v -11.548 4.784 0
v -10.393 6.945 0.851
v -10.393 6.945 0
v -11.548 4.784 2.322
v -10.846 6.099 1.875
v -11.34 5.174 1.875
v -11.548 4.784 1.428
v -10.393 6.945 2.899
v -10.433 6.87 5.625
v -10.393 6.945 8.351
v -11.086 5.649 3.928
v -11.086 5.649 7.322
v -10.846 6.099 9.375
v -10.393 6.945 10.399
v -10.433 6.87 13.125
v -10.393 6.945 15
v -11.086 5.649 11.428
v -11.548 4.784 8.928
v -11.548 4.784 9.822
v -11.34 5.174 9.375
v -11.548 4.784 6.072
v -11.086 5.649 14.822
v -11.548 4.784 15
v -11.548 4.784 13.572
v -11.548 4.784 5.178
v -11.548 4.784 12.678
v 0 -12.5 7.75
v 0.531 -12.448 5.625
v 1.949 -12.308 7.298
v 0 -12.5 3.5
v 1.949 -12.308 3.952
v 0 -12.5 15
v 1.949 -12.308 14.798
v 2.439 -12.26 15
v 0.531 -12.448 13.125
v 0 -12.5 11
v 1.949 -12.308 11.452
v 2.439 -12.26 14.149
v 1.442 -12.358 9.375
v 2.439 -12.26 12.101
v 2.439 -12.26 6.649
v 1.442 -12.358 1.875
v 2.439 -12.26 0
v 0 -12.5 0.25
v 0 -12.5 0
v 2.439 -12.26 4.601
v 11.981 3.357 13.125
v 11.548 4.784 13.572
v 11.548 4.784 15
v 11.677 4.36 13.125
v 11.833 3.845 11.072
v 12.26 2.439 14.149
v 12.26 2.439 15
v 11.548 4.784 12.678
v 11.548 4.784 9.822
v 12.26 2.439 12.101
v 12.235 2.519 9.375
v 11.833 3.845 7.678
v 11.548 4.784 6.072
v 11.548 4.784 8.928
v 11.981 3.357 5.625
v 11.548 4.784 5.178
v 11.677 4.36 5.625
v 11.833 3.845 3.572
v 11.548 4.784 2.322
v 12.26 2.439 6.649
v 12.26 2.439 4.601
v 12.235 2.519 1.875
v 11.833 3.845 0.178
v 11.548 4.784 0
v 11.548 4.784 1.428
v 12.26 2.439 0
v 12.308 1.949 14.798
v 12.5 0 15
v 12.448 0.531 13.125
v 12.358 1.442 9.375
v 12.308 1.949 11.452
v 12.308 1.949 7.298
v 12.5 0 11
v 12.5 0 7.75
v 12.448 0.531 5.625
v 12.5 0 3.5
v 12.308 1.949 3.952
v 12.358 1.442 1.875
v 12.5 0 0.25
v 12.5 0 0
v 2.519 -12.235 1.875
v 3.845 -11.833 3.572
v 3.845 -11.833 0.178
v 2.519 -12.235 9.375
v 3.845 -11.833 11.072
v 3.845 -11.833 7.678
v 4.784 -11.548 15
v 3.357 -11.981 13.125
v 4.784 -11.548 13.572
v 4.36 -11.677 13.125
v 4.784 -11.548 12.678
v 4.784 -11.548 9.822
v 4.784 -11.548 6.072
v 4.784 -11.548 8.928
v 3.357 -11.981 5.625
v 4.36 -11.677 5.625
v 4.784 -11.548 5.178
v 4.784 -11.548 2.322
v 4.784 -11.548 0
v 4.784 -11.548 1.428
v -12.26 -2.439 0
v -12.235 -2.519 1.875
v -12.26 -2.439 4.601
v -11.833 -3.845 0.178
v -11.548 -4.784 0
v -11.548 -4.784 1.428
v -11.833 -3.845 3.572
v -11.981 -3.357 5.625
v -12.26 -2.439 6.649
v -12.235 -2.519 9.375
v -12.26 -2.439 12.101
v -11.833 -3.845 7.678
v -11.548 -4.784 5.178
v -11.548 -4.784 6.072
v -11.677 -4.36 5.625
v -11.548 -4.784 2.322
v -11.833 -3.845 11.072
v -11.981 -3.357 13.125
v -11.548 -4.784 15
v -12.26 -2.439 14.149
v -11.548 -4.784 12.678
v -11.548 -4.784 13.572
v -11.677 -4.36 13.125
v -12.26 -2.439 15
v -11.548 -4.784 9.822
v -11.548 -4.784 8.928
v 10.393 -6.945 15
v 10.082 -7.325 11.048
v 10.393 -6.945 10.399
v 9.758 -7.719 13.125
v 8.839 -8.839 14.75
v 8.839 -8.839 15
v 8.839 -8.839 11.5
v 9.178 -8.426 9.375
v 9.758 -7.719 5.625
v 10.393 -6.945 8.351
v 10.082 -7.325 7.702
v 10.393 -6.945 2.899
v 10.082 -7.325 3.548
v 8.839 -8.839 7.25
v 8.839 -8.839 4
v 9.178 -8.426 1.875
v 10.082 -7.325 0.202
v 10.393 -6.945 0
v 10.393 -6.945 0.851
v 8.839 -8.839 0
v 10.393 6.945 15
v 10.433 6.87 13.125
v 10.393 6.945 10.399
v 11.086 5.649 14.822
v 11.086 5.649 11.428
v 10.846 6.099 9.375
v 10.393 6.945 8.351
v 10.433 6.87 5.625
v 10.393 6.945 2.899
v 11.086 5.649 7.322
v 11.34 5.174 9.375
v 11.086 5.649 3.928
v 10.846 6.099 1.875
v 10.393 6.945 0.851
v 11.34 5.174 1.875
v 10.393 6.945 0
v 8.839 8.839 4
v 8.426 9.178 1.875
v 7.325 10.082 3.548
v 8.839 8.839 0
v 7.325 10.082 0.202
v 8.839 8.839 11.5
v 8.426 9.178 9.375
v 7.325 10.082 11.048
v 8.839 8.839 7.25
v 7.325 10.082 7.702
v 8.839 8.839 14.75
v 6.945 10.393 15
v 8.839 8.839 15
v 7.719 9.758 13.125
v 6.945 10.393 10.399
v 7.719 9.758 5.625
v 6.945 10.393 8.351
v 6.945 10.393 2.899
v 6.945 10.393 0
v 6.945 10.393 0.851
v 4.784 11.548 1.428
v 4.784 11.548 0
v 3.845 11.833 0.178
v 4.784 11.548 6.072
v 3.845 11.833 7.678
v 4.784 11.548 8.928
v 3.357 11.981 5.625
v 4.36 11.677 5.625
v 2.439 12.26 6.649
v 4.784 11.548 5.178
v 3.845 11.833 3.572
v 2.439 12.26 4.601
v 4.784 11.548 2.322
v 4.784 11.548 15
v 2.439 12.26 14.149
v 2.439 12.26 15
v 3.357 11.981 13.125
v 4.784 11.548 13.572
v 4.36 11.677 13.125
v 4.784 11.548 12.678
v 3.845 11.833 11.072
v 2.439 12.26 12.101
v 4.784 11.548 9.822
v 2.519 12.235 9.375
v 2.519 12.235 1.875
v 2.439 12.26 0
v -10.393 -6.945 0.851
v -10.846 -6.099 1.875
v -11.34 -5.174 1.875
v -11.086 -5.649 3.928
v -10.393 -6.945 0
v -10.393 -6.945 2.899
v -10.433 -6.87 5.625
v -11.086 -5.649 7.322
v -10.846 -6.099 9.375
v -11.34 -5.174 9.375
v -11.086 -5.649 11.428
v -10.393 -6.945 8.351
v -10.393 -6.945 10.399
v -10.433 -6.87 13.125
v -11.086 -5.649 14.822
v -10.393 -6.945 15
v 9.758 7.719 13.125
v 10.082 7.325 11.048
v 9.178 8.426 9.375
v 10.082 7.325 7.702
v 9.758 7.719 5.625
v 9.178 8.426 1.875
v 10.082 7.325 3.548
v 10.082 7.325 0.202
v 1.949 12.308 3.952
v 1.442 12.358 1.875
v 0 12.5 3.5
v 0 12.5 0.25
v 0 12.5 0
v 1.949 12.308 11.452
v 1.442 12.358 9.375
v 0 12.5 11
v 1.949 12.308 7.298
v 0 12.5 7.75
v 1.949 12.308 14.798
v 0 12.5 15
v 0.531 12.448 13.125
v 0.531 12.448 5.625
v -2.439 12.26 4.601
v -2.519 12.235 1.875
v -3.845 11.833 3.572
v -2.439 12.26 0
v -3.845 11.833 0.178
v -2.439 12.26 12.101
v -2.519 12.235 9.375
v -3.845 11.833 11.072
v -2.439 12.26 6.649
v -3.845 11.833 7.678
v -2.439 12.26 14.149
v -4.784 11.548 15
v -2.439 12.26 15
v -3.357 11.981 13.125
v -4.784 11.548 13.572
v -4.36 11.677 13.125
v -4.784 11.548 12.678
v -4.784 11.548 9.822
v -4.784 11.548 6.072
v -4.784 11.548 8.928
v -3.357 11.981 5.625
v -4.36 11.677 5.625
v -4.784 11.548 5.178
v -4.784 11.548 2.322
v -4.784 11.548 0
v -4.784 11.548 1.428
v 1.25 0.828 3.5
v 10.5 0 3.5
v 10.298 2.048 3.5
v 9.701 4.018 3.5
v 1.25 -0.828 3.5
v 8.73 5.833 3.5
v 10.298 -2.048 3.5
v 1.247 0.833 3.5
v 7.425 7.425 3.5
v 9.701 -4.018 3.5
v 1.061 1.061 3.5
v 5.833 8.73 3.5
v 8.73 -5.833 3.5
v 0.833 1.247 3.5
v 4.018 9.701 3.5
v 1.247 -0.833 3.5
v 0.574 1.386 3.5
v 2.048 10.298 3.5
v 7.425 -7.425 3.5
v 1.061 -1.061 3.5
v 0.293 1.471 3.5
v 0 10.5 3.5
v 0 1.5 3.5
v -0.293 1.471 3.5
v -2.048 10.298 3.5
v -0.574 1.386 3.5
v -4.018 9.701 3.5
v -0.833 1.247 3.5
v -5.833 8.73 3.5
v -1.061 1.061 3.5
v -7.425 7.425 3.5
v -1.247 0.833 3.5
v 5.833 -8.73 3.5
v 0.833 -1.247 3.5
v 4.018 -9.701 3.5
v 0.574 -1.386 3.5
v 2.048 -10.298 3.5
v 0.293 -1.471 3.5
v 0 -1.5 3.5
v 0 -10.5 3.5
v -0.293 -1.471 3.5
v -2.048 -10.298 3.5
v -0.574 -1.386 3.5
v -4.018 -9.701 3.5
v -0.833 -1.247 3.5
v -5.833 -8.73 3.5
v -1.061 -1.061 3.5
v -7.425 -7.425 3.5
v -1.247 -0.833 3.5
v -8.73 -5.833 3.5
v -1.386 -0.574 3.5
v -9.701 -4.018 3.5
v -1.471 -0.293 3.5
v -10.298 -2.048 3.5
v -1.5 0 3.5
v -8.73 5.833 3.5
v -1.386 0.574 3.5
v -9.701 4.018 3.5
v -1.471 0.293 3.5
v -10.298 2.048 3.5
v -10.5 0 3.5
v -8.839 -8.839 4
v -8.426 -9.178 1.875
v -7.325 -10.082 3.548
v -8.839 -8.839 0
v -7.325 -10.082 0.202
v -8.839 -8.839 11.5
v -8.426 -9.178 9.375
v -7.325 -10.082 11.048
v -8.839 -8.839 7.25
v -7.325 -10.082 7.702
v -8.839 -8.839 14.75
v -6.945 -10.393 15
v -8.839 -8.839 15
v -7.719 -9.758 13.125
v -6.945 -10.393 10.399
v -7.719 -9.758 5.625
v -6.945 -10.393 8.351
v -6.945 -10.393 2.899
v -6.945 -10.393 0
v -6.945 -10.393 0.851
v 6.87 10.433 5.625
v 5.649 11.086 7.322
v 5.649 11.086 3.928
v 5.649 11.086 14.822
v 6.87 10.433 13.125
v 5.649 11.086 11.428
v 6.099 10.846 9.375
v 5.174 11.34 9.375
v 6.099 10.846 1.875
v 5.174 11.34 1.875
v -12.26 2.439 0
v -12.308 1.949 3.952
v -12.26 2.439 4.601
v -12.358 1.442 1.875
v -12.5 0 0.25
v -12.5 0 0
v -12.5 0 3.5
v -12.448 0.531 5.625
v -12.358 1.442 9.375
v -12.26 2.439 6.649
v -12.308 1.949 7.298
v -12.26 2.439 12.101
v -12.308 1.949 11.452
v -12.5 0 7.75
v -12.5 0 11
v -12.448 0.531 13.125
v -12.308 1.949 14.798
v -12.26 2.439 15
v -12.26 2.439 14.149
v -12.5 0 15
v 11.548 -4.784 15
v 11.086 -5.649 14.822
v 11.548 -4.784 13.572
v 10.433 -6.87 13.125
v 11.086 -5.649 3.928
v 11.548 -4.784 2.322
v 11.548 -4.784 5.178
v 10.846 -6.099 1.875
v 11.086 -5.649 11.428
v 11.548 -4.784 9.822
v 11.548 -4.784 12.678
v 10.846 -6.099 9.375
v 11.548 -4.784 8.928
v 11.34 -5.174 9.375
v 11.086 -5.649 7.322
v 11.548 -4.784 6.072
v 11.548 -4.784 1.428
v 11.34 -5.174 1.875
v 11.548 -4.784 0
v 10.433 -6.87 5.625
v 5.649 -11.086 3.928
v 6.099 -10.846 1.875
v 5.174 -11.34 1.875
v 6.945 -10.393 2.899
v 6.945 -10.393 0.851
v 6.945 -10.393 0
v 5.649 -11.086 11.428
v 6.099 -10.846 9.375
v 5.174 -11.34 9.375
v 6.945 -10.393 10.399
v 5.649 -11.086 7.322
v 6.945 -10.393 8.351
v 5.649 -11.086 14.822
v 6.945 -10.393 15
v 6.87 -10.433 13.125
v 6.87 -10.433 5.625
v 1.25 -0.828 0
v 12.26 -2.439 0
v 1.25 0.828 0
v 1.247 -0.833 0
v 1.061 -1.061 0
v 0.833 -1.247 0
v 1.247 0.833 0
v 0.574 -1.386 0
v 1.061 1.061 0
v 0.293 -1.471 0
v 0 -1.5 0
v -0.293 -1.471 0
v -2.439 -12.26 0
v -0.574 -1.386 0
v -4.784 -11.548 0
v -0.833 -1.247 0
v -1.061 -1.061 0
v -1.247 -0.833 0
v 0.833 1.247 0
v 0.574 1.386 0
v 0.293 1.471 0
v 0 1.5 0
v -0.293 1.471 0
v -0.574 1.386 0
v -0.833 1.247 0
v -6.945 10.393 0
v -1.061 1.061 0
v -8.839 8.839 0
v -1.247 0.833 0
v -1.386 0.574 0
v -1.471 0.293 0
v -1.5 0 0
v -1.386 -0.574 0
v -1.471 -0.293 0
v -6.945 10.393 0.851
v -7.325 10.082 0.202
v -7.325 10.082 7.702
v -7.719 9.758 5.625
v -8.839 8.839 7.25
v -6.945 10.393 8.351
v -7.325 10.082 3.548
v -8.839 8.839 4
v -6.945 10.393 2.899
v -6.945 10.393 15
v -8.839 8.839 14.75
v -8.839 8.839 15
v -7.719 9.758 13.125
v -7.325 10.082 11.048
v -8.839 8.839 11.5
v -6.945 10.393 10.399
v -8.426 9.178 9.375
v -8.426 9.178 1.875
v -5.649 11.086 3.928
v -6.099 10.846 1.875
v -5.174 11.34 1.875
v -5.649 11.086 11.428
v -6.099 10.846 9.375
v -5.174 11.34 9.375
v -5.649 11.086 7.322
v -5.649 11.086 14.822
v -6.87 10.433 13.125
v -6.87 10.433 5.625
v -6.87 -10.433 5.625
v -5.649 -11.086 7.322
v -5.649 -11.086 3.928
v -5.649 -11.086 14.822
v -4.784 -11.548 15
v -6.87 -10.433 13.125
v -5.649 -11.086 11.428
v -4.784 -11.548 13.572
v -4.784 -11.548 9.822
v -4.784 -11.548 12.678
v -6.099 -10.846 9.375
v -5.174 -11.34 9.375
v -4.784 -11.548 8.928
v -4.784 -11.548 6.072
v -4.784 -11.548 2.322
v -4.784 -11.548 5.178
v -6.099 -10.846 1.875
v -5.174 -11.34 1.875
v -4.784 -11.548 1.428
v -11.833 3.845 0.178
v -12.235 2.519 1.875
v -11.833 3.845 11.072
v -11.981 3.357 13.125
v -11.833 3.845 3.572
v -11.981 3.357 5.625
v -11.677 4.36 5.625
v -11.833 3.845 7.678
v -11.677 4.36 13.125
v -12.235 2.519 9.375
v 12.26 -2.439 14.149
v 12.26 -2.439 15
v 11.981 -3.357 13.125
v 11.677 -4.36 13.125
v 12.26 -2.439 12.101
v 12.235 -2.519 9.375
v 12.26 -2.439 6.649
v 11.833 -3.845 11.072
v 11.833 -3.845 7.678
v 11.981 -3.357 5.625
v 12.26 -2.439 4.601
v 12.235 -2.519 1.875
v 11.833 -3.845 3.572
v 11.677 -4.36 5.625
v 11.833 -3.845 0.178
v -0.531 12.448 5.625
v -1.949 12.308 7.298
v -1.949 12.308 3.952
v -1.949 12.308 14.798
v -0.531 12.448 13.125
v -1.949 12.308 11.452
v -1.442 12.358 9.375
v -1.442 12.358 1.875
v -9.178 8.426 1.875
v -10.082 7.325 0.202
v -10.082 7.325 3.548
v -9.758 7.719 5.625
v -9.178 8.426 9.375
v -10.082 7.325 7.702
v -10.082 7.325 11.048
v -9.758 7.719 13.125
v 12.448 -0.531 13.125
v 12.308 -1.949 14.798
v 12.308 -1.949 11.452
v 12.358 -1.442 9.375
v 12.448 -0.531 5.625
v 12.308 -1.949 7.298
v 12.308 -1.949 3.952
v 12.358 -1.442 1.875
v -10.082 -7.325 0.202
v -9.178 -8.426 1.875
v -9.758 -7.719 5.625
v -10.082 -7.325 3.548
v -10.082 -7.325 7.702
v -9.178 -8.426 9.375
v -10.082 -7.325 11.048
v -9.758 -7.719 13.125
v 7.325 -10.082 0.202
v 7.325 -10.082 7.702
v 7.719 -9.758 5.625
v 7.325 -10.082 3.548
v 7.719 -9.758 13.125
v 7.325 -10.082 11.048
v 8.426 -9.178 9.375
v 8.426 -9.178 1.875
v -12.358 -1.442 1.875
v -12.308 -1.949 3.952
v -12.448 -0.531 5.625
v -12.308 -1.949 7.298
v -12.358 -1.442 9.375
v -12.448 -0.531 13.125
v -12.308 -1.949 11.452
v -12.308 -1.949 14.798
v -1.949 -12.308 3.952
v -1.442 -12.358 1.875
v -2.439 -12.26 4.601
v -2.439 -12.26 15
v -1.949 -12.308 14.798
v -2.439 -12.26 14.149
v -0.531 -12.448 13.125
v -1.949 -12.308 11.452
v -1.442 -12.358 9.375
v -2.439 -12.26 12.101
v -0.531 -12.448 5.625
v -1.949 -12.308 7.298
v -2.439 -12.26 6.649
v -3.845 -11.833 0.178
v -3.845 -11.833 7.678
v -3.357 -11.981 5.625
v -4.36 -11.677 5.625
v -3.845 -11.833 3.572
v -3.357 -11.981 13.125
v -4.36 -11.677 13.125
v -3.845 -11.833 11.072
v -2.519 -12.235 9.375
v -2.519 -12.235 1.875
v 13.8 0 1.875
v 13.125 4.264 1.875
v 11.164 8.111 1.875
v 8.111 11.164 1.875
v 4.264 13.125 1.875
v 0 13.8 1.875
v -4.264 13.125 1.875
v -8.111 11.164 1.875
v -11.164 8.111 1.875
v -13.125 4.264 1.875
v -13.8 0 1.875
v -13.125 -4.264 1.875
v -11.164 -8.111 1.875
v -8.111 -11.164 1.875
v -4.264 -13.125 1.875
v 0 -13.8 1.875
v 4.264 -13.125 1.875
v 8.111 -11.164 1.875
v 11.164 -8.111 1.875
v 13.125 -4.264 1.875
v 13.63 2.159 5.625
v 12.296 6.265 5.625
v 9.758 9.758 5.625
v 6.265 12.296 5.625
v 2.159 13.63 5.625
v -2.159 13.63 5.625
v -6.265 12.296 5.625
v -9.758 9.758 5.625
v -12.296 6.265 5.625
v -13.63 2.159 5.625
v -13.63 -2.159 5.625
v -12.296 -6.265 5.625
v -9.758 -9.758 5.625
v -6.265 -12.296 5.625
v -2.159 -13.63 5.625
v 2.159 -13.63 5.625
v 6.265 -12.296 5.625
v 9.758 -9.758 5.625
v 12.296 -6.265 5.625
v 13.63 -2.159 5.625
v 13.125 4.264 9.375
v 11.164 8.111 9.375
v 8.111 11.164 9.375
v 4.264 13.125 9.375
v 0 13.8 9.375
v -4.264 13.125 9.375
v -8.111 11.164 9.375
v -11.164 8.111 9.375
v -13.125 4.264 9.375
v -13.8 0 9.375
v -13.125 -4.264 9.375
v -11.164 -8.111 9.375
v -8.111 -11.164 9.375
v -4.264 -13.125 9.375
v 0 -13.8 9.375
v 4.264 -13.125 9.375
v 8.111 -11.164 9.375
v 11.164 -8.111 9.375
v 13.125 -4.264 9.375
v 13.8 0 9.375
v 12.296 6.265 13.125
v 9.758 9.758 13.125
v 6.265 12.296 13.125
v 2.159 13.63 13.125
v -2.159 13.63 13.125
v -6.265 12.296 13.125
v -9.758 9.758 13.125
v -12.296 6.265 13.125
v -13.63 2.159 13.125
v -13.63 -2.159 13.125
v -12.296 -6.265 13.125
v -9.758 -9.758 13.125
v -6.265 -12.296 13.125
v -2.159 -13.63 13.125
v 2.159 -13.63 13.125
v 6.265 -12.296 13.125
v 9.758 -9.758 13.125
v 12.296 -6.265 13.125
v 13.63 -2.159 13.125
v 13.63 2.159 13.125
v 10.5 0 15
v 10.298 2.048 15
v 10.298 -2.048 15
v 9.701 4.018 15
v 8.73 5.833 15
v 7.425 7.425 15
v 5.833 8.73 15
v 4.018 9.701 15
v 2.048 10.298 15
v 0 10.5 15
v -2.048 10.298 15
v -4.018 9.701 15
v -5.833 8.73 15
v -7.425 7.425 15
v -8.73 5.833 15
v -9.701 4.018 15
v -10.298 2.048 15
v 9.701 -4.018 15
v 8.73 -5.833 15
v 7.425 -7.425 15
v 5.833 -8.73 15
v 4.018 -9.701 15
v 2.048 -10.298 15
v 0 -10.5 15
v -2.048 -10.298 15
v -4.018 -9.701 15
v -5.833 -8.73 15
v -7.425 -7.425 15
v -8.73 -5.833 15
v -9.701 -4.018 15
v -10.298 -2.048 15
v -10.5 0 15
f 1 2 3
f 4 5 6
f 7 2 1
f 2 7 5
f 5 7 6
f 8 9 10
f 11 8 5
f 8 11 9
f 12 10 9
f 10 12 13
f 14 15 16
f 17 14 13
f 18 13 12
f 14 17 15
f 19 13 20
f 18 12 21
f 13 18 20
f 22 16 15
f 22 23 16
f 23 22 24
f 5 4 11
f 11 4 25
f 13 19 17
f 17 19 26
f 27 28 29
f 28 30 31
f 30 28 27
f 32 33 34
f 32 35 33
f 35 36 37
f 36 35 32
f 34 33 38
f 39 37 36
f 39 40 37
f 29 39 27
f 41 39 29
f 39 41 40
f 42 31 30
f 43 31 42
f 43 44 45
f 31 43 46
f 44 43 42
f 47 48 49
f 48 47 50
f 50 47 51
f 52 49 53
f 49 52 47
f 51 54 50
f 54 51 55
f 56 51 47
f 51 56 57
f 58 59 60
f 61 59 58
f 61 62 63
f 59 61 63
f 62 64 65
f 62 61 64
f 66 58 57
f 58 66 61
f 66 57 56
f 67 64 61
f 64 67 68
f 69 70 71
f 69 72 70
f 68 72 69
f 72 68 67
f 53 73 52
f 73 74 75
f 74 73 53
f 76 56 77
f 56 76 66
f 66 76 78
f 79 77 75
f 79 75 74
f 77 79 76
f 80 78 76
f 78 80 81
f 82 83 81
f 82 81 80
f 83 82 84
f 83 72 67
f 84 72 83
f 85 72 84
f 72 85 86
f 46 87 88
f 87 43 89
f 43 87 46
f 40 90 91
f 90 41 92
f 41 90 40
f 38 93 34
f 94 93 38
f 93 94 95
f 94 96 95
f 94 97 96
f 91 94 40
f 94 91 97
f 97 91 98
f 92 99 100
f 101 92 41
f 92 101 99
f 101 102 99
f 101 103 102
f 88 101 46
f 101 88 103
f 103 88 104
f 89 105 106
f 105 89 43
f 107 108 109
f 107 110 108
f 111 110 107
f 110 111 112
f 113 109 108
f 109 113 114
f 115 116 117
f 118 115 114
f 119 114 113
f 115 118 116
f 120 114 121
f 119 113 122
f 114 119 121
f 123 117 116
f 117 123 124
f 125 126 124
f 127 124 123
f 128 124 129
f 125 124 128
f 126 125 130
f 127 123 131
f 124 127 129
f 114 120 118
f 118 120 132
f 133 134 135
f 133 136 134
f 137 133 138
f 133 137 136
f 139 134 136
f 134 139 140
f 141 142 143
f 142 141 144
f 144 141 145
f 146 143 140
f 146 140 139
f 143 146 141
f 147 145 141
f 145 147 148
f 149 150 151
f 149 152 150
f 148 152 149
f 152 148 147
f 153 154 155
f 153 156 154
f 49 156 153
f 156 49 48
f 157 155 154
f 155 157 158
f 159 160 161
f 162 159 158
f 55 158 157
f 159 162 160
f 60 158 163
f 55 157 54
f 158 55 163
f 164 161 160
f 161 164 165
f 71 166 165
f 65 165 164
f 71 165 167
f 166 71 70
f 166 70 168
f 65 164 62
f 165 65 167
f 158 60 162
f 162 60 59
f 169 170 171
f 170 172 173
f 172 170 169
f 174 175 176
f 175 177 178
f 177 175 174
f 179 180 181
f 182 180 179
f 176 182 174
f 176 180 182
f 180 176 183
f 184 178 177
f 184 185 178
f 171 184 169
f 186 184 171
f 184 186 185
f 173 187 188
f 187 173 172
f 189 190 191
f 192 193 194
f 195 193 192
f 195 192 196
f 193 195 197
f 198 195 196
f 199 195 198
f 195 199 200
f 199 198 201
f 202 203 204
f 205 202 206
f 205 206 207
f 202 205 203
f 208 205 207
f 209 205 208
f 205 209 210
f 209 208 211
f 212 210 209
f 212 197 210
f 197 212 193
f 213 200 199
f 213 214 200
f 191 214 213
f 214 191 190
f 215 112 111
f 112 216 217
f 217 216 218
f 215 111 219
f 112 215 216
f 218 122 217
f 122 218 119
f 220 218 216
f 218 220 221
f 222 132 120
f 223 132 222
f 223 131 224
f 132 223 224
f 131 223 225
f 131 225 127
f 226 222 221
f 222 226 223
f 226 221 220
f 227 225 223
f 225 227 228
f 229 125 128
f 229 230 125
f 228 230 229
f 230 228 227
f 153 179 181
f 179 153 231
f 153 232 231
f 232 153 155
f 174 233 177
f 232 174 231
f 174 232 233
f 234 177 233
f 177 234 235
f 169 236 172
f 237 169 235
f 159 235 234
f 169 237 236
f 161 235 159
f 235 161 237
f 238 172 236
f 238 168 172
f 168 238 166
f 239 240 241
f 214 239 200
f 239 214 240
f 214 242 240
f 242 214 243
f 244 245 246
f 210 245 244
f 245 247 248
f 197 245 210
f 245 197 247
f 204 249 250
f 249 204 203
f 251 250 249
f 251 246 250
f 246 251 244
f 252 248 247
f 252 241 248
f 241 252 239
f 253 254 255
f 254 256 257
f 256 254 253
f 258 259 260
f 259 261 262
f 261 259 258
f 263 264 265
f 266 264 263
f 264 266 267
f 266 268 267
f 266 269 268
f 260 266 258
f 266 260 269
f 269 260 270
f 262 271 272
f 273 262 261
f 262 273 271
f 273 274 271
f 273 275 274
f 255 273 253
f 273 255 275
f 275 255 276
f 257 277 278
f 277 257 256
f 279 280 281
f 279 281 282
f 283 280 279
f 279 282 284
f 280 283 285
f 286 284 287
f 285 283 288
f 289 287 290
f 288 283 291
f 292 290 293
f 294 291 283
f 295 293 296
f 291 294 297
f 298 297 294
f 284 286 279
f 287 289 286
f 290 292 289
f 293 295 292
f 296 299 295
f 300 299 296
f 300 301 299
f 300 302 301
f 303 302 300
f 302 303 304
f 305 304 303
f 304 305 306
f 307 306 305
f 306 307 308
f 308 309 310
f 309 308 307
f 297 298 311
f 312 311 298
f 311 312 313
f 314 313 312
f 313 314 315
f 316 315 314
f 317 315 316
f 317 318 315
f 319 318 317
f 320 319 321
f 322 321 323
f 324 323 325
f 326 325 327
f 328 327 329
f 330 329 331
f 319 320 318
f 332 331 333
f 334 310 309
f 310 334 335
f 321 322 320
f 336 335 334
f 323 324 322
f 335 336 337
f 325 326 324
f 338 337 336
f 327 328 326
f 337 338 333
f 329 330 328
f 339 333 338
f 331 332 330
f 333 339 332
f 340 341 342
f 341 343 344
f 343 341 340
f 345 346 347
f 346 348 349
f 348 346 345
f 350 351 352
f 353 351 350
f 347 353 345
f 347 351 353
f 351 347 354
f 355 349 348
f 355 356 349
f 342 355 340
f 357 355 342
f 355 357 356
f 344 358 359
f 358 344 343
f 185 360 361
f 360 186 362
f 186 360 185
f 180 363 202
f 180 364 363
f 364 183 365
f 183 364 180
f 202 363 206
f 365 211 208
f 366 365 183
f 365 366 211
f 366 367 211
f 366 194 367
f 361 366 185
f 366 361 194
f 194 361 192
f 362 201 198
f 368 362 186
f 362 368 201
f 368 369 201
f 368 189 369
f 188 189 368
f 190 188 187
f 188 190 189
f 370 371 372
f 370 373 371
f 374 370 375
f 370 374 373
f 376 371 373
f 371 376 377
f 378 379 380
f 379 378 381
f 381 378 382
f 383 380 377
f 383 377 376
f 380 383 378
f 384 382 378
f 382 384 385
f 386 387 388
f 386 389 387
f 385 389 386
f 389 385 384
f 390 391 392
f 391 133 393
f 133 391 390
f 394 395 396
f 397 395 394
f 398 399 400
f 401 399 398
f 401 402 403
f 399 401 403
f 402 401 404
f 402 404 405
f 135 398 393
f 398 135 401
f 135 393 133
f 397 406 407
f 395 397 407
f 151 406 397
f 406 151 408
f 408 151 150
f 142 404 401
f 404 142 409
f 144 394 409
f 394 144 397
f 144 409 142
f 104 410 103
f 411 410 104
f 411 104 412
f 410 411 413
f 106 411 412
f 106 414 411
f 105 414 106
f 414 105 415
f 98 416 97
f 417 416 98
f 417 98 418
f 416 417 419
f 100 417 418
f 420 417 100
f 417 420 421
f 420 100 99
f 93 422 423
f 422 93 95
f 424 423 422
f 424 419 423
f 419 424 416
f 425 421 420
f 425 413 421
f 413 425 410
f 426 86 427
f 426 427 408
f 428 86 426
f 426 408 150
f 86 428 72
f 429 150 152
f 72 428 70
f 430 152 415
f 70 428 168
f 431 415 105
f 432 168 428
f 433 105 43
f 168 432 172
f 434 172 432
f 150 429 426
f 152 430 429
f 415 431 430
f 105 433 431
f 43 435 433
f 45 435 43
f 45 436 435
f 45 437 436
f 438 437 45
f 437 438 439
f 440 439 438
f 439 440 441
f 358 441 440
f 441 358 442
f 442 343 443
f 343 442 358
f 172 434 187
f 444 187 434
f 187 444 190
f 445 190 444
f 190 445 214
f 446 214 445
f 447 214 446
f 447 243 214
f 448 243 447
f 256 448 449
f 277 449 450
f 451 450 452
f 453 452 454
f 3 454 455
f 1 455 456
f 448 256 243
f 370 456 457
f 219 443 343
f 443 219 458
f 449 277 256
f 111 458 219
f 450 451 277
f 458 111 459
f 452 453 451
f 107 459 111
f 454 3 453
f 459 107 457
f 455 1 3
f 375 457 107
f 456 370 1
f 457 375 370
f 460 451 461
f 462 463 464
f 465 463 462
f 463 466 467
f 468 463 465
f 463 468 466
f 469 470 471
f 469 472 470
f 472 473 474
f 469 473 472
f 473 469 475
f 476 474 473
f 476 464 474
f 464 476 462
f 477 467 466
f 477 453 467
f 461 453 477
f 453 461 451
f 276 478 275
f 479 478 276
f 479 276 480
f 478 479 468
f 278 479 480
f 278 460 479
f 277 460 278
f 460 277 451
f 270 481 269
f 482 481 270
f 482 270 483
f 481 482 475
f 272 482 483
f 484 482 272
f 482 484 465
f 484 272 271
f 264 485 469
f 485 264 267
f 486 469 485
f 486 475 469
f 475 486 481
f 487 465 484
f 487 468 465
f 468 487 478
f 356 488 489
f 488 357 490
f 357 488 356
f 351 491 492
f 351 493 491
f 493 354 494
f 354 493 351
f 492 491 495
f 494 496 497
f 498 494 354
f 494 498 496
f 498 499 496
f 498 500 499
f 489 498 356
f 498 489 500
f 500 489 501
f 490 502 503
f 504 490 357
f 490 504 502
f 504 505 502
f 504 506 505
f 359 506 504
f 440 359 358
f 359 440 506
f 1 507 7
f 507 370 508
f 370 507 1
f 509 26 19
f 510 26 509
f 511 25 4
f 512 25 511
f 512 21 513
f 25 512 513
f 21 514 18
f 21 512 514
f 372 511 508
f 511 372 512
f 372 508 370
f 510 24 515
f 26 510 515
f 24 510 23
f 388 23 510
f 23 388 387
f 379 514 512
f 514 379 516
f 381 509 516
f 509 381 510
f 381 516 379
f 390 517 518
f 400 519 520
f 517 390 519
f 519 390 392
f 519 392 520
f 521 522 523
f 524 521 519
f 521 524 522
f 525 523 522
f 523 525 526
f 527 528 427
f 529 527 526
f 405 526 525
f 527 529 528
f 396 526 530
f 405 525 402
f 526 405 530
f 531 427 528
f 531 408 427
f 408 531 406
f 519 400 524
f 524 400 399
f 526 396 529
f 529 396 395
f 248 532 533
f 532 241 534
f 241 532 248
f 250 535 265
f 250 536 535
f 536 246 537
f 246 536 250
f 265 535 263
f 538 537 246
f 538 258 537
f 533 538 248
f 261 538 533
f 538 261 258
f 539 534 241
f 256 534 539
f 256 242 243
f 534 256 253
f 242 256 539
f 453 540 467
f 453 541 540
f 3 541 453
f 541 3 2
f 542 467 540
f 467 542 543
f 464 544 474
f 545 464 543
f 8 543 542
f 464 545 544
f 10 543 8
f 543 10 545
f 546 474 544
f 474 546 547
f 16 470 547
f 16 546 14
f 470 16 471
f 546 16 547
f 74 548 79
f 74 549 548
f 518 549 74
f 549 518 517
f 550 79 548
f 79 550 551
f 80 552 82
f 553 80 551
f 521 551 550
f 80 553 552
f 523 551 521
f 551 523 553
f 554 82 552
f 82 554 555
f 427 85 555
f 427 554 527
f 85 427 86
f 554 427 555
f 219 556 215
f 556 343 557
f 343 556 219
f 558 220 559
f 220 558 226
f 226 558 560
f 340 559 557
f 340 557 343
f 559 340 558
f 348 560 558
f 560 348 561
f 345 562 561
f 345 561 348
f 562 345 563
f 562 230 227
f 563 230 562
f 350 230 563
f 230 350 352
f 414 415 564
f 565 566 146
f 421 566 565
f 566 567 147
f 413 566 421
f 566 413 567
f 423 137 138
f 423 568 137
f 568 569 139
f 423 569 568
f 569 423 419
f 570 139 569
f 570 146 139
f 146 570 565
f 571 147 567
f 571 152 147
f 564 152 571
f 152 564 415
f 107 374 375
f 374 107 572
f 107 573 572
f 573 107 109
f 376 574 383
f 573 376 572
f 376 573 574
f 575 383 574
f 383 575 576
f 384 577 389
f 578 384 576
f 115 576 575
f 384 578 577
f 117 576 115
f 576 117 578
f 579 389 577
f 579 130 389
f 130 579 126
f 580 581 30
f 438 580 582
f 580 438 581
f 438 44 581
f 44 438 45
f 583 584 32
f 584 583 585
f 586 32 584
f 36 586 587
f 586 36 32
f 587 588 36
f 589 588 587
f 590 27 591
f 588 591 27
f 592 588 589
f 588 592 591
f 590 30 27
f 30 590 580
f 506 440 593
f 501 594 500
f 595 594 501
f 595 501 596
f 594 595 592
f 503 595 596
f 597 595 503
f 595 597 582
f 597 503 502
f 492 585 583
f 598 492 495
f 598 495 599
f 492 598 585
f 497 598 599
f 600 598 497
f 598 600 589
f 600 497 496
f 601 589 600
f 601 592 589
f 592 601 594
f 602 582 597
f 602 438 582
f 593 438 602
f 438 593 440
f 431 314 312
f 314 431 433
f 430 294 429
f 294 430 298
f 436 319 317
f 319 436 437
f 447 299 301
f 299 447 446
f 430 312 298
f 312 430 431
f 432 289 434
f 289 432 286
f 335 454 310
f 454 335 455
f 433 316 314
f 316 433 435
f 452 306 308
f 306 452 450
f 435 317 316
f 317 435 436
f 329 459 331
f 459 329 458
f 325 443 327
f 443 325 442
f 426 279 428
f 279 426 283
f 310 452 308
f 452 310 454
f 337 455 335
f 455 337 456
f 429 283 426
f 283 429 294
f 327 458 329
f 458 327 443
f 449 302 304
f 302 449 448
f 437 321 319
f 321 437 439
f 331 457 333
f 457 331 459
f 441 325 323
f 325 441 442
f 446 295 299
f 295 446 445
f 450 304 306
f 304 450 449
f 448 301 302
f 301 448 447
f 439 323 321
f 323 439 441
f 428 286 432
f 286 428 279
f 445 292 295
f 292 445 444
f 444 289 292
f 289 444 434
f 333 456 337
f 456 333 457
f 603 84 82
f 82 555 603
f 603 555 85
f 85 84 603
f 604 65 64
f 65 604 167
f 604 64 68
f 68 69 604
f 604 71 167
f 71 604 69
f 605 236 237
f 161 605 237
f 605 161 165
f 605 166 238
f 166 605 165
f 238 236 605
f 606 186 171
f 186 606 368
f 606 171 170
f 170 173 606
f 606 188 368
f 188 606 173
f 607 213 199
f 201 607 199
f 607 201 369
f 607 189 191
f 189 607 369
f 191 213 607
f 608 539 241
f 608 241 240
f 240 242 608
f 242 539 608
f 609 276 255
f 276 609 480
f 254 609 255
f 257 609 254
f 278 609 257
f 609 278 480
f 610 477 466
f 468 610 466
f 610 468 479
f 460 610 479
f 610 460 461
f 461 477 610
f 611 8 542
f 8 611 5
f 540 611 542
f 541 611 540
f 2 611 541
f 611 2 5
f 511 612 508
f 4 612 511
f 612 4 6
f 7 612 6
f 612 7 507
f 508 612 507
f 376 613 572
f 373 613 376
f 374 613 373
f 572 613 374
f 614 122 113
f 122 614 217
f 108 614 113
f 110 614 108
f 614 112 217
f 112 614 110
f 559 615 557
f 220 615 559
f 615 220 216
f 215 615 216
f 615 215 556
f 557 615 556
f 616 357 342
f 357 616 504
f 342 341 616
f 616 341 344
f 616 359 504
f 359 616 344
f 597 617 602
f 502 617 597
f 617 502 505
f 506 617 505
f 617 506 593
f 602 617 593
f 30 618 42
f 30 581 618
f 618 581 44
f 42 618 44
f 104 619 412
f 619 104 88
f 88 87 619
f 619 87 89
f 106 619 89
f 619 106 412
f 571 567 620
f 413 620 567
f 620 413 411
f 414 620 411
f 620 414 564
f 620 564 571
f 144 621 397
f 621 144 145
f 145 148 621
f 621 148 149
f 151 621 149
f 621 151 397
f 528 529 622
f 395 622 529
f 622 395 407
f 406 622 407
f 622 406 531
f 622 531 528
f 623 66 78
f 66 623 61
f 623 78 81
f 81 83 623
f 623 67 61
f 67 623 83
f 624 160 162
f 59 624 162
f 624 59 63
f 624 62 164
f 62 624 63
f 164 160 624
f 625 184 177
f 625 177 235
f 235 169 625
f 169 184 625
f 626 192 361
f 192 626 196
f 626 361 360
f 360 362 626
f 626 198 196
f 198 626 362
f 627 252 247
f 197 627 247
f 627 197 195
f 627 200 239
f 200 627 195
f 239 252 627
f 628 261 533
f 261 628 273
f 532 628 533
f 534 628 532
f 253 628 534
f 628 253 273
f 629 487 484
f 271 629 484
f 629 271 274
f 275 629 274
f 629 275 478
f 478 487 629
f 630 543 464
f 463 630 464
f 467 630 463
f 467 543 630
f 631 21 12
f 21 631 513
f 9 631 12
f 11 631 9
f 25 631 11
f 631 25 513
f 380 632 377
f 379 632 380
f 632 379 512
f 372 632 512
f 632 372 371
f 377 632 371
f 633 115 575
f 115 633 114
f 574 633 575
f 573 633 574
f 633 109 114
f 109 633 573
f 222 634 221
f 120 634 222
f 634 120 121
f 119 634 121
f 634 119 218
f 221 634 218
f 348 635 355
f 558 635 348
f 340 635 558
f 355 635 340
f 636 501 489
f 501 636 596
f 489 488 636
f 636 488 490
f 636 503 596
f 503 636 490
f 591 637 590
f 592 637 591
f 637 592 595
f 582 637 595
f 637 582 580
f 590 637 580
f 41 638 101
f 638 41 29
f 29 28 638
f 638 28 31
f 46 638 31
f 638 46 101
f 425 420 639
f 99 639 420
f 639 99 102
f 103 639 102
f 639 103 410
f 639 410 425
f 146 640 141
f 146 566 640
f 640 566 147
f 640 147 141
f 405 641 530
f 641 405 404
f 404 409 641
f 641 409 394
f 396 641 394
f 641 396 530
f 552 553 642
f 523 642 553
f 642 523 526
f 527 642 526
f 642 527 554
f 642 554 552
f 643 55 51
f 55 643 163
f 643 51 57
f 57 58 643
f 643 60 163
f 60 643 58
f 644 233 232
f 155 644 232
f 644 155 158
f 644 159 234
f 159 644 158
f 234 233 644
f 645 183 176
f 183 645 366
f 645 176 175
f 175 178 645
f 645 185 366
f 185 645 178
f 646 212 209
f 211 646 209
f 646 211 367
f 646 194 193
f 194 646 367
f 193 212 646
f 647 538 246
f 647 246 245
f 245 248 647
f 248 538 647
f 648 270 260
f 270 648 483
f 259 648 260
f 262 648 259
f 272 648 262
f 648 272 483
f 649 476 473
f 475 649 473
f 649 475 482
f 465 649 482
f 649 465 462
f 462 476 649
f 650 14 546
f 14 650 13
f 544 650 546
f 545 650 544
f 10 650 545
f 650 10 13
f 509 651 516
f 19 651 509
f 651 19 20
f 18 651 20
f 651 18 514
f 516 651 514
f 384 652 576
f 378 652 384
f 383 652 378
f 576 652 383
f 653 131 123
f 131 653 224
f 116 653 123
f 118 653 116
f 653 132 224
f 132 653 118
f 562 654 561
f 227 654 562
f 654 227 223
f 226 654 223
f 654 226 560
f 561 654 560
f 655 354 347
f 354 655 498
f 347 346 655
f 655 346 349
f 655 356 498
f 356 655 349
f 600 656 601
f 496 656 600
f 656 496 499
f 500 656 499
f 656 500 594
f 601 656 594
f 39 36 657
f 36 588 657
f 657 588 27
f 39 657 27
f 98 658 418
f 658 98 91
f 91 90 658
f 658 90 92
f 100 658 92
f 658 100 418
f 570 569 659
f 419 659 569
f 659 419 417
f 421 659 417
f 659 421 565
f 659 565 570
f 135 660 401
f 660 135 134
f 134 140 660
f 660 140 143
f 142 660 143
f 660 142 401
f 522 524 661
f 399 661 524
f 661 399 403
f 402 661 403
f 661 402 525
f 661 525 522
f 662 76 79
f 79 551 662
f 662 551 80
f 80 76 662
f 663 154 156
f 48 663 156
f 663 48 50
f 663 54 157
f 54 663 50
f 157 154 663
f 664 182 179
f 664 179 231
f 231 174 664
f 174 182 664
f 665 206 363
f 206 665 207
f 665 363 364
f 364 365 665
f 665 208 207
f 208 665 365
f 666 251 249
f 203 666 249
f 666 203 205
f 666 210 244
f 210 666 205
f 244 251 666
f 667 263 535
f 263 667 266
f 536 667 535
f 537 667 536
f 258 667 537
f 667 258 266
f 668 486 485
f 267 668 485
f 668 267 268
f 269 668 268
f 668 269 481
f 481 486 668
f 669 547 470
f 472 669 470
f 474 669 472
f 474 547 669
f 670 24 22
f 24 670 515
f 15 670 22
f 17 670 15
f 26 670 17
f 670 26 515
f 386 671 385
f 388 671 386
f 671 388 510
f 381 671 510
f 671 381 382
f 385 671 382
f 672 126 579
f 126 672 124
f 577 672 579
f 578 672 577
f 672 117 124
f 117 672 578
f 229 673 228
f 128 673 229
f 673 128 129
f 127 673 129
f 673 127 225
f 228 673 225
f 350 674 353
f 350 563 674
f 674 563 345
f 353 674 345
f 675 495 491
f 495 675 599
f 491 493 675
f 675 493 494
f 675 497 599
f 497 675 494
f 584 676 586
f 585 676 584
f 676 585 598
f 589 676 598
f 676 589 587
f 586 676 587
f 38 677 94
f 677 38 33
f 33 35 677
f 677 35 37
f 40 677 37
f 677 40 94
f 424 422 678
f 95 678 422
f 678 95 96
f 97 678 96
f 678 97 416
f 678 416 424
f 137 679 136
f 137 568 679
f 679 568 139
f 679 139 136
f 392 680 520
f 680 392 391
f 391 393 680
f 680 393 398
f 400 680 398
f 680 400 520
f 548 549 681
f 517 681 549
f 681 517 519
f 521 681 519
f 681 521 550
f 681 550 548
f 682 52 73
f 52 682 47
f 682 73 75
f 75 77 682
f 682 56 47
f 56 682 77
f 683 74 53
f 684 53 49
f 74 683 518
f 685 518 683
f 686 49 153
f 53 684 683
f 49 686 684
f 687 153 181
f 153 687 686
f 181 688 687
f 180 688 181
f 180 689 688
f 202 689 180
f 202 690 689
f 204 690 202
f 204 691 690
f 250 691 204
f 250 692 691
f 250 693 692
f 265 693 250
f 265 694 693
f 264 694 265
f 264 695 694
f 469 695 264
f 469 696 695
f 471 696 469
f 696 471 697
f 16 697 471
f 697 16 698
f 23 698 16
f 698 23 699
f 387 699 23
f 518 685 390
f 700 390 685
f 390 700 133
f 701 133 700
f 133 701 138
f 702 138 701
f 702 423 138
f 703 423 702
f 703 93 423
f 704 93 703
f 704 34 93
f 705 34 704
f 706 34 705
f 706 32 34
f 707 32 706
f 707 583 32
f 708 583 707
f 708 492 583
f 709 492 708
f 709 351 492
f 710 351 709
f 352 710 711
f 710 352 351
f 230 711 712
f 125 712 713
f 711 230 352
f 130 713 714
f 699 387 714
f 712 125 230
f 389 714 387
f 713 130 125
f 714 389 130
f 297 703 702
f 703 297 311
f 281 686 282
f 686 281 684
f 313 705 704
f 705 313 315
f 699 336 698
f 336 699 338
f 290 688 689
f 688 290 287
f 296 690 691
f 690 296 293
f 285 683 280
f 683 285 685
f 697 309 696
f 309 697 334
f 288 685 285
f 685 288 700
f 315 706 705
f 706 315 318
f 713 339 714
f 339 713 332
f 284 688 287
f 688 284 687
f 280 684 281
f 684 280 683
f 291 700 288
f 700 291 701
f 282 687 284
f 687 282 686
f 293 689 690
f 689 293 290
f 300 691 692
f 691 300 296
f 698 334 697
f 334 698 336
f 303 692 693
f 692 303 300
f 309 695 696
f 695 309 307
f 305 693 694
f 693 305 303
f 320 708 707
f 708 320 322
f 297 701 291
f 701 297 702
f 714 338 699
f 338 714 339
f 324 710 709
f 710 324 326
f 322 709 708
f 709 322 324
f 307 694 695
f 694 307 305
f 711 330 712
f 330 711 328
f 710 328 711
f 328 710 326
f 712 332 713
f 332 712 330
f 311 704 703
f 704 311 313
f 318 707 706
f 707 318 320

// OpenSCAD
// Spiky TPU tire

$fn = 32;

shaft_flat_dia = 2.5;
shaft_round_dia = 3.0;
shaft_len = 5.25;

tire_inner_dia = 21.0;
tire_outer_dia = tire_inner_dia + 4.0;
tire_h = 15.0;

spike_l = 1.5;
spike_w = 3.0;
tire_spike_dist = tire_h;
num_spikes = 20;
num_spike_layers = 4;
spike_h = tire_spike_dist/num_spike_layers;

module motorShaft() {
    linear_extrude(shaft_len)
    difference() {
        circle(d=shaft_round_dia);
        translate([shaft_flat_dia+shaft_flat_dia/2, 0])
        square([shaft_flat_dia*2, shaft_flat_dia*2], center=true);
    }
}

module tireMotorInterface() {
    difference() {
    cylinder(d=tire_outer_dia, h=shaft_len/1.5);
    motorShaft();
    }
}

module tireSpike() {
    translate([tire_outer_dia/2-0.2, 0, spike_h/2])
    linear_extrude(spike_h/2, scale=0)
    polygon([[0,spike_w/2],[spike_l,0],[0,-spike_w/2]]);
    rotate([180,0,0])
    translate([tire_outer_dia/2-0.2, 0, -spike_h/2])
    linear_extrude(spike_h/2, scale=0)
    polygon([[0,spike_w/2],[spike_l,0],[0,-spike_w/2]]);
}

module tireSpikeRing() {
    for (i=[0:num_spikes]) {
        rotate([0,0,(i/num_spikes)*360])
        tireSpike();
    }
}

module tireTread() {
    for (i=[0:num_spike_layers-1]) {
        rotate([0,0,i*180/num_spikes])
        translate([0,0,i*(tire_spike_dist/num_spike_layers)])
        tireSpikeRing();
    }
}

module tire() {
    tireMotorInterface();
    tireTread();
    difference() {
    cylinder(d=tire_outer_dia, h=tire_h);
    cylinder(d=tire_inner_dia, h=tire_h);
    }
}

tire();
